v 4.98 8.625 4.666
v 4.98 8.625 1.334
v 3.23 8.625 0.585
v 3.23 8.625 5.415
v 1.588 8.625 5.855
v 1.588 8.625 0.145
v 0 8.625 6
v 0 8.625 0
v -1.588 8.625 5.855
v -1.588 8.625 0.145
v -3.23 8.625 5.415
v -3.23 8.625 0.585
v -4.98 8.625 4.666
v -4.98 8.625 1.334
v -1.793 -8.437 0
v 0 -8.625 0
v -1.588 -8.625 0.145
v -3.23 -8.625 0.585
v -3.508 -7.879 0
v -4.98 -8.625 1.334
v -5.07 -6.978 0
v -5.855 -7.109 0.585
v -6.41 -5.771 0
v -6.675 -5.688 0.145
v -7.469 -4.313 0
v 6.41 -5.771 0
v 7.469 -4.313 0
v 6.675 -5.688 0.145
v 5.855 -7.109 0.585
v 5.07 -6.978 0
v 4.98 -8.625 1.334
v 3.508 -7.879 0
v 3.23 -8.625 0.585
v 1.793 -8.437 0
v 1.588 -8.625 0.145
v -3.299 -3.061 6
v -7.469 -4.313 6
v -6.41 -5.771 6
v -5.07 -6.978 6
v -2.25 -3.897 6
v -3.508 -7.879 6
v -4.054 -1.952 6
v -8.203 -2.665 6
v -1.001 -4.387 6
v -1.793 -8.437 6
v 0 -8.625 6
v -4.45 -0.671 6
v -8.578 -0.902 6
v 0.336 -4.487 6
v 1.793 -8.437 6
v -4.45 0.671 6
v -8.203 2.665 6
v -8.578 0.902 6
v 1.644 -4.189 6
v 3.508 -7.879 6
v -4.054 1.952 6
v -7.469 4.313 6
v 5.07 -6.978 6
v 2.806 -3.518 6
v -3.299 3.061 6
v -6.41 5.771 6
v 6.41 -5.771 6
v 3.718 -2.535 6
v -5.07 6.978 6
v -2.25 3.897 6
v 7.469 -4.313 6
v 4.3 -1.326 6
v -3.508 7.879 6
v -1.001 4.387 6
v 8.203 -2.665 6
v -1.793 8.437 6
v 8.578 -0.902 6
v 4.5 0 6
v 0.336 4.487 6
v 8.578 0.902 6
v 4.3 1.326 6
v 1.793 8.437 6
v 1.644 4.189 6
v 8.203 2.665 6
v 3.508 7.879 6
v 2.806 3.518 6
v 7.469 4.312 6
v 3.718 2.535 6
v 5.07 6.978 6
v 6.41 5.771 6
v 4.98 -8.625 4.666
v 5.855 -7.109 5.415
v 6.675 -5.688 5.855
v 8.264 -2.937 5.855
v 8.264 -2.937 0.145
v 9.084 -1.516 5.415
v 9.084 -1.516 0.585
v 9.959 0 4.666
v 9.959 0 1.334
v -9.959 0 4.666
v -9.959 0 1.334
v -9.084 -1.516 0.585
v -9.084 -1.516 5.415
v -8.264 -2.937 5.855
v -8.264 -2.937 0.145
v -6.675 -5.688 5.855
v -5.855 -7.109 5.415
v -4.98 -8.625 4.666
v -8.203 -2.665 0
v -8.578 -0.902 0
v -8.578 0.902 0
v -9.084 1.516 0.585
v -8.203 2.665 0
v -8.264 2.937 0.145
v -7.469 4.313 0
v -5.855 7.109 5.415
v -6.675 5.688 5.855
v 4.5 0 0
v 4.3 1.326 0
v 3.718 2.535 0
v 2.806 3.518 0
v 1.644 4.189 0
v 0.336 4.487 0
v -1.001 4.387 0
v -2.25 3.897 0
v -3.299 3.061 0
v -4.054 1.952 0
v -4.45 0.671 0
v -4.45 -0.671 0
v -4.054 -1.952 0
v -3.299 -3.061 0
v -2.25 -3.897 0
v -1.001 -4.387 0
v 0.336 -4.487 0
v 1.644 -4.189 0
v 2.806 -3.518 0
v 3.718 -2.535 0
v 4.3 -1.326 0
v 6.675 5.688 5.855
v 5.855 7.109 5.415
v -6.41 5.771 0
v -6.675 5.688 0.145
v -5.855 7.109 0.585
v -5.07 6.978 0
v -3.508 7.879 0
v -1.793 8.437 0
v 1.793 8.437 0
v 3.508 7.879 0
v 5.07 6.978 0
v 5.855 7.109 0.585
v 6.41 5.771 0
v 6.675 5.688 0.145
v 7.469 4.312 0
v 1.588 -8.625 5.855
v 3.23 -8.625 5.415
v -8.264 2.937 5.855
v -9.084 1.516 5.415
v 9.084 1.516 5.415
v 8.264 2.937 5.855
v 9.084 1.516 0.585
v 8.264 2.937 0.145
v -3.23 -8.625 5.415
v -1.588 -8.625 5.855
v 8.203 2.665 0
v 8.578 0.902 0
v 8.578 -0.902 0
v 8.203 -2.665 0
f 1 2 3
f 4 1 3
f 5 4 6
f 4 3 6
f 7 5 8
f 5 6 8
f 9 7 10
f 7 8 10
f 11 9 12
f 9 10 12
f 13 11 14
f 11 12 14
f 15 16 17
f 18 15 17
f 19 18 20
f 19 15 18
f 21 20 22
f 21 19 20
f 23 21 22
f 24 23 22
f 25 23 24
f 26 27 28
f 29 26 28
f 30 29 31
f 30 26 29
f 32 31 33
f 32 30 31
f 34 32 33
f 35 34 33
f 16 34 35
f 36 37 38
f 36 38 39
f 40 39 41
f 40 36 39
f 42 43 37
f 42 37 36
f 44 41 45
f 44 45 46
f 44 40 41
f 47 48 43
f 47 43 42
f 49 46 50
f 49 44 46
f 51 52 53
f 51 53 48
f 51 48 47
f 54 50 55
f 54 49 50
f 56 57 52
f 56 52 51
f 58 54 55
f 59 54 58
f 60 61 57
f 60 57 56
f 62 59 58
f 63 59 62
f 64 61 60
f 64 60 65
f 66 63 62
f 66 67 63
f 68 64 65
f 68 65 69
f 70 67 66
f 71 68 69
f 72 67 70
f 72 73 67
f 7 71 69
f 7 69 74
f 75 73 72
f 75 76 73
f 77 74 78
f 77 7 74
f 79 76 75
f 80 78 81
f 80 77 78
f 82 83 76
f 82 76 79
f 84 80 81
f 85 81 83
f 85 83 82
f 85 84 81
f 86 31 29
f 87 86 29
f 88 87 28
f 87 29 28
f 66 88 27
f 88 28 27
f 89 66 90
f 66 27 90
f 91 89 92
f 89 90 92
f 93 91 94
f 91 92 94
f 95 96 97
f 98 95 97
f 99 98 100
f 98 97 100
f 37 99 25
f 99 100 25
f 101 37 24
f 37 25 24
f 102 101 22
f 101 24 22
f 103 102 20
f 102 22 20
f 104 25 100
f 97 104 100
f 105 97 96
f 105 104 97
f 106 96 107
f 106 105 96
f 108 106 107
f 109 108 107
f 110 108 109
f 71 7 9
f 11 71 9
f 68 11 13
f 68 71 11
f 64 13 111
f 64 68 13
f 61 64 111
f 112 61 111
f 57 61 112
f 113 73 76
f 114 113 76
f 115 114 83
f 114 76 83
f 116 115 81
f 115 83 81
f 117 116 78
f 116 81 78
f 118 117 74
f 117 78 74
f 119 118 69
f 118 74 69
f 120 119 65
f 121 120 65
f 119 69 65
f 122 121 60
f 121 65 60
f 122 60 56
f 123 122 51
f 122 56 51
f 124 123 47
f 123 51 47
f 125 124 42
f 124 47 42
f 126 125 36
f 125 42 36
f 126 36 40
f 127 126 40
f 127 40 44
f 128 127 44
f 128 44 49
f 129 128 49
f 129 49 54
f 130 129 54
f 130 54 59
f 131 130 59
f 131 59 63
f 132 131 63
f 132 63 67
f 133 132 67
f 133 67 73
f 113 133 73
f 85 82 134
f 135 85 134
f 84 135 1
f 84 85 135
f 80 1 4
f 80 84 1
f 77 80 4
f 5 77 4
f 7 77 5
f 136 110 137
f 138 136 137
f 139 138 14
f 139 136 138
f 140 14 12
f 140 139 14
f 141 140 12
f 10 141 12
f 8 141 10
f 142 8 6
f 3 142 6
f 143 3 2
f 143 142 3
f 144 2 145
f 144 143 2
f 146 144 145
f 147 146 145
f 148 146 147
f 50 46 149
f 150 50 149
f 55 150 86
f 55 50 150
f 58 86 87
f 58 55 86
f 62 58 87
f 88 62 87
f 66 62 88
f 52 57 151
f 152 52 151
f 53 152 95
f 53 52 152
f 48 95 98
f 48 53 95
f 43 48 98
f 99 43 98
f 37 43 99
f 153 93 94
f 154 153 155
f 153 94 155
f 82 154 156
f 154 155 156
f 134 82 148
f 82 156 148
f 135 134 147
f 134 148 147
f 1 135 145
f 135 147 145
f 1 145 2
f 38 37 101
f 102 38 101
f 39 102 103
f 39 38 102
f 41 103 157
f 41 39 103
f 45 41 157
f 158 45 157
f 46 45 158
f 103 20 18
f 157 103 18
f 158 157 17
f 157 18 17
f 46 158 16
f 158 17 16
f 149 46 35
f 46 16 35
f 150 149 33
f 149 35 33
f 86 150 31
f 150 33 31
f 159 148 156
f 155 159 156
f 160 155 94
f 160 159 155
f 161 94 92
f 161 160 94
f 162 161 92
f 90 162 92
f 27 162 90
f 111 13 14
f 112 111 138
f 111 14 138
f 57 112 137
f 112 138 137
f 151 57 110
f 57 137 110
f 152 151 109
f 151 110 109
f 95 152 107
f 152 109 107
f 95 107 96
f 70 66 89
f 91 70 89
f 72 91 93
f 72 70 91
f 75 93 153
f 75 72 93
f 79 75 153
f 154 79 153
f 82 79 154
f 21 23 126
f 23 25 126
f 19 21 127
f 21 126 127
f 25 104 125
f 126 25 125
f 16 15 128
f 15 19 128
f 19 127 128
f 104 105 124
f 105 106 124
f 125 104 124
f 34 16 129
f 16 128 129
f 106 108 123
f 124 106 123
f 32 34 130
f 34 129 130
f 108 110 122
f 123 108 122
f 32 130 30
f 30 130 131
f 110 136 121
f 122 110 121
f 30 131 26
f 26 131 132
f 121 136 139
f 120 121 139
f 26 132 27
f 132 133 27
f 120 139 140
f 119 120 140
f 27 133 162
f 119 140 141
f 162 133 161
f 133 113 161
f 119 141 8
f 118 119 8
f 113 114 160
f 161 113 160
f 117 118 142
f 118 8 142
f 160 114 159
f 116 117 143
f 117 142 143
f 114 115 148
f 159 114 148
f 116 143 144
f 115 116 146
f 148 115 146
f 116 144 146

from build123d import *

# Parameters (mm, degrees)
BOSS_EXTRUDE1_DEPTH = 6
SKETCH2_OUTSIDE_W   = 39.322
SKETCH2_OUTSIDE_H   = 36.654
SKETCH2_OUTSIDE_R   = 8.625
CUT_EXTRUDE1_DEPTH  = 6
CUT_EXTRUDE1_DRAFT  = -45
SKETCH3_OUTSIDE_W   = 39.322
SKETCH3_OUTSIDE_H   = 36.654
SKETCH3_OUTSIDE_R   = 8.625
CUT_EXTRUDE2_DEPTH  = 6
CUT_EXTRUDE2_DRAFT  = -45
SKETCH4_R           = 4.5
CUT_EXTRUDE3_DEPTH  = 7


with BuildPart() as part:
    # Sketch1 → Boss-Extrude1 (new body)
    with BuildSketch(Plane.XY):
        Polygon((9.959292144, 0), (4.979646072, 8.625), (-4.979646072, 8.625), (-9.959292144, 0), (-4.979646072, -8.625), (4.979646072, -8.625), align=None)
    extrude(amount=BOSS_EXTRUDE1_DEPTH)


with BuildPart() as cut_extrude1_tool:
    # Sketch2 outside → Cut-Extrude1 (with draft: the straight prism first)
    with BuildSketch(Plane.XY.offset(6)):
        Rectangle(SKETCH2_OUTSIDE_W, SKETCH2_OUTSIDE_H)
        Circle(SKETCH2_OUTSIDE_R, mode=Mode.SUBTRACT)
    extrude(amount=-CUT_EXTRUDE1_DEPTH)
    # Cut-Extrude1: the draft: its side faces are tilted about the plane it starts from
    cut_extrude1_sides = [cut_extrude1_tool.faces().sort_by_distance(p)[0] for p in [
        (0, -18.327, 3),
        (19.661, 0, 3),
        (0, 18.327, 3),
        (-19.661, 0, 3),
        (-8.625, 0, 3),
    ]]
    draft(cut_extrude1_sides, Plane.XY.offset(6), CUT_EXTRUDE1_DRAFT)


with BuildPart() as part_1:
    add(part.part)

    # Cut-Extrude1: cut by cut_extrude1_tool
    add(cut_extrude1_tool.part, mode=Mode.SUBTRACT)


with BuildPart() as cut_extrude2_tool:
    # Sketch3 outside → Cut-Extrude2 (with draft: the straight prism first)
    with BuildSketch(Plane(origin=(0, 0, 0), x_dir=(-1, 0, 0), z_dir=(0, 0, -1))):
        Rectangle(SKETCH3_OUTSIDE_W, SKETCH3_OUTSIDE_H)
        Circle(SKETCH3_OUTSIDE_R, mode=Mode.SUBTRACT)
    extrude(amount=-CUT_EXTRUDE2_DEPTH)
    # Cut-Extrude2: the draft: its side faces are tilted about the plane it starts from
    cut_extrude2_sides = [cut_extrude2_tool.faces().sort_by_distance(p)[0] for p in [
        (0, -18.327, 3),
        (-19.661, 0, 3),
        (0, 18.327, 3),
        (19.661, 0, 3),
        (8.625, 0, 3),
    ]]
    draft(cut_extrude2_sides, Plane(origin=(0, 0, 0), x_dir=(-1, 0, 0), z_dir=(0, 0, -1)), CUT_EXTRUDE2_DRAFT)


with BuildPart() as part_2:
    add(part_1.part)

    # Cut-Extrude2: cut by cut_extrude2_tool
    add(cut_extrude2_tool.part, mode=Mode.SUBTRACT)

    # Sketch4 → Cut-Extrude3 (cut, through all)
    with BuildSketch(Plane.XY.offset(6)):
        Circle(SKETCH4_R)
    extrude(amount=-CUT_EXTRUDE3_DEPTH, mode=Mode.SUBTRACT)


solid = part_2.part
